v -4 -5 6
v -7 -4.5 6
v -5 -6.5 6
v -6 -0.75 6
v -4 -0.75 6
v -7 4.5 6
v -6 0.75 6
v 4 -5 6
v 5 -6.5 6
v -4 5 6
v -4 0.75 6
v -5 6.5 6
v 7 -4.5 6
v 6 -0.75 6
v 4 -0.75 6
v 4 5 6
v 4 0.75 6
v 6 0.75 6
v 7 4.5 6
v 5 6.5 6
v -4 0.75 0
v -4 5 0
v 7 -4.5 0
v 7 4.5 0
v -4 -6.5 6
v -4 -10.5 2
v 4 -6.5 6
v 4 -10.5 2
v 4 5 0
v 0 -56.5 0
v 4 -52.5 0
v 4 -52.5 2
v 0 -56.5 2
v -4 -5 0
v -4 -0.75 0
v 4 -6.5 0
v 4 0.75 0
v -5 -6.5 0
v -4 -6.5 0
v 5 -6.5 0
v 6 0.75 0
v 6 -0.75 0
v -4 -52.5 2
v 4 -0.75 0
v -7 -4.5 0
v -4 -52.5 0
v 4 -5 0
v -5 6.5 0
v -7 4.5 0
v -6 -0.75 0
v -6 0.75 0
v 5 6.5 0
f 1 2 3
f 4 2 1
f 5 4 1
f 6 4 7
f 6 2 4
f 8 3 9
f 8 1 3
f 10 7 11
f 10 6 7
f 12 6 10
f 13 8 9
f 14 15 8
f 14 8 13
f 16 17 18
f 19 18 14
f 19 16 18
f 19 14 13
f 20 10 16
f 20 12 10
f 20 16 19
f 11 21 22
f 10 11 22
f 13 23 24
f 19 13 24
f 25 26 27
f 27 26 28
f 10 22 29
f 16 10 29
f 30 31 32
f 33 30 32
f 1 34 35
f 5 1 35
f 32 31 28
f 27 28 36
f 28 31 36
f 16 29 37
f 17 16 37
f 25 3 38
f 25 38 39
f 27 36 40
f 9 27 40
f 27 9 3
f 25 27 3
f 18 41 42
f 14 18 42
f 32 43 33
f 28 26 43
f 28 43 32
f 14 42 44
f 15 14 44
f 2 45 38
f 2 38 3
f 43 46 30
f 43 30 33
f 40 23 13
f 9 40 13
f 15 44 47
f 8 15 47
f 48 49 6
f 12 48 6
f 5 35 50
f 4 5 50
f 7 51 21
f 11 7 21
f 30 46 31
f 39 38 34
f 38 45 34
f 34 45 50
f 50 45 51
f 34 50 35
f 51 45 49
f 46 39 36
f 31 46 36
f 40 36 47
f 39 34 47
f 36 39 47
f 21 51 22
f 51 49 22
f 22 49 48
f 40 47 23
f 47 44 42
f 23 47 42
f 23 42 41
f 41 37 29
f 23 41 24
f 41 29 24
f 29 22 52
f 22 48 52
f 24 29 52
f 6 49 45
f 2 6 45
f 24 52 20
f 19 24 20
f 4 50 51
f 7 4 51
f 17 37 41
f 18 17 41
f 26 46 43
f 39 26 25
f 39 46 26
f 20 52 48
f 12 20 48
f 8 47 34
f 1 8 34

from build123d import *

# Parameters (mm, degrees)
F1_DEPTH = 6
F0_W     = 8
F0_H     = 50
F2_DEPTH = 2
F3_SIZE  = 3.99999
F4_SIZE  = 2


# Not quite as in the source:
# - a fillet or chamfer is up to 0.001 mm smaller than in the source, because OpenCascade refuses the exact size


with BuildPart() as f1:
    # F0 (on Top) → F1 (new body)
    with BuildSketch(Plane.XY):
        Polygon((4, -6.5), (7, -6.5), (7, 6.5), (-7, 6.5), (-7, -6.5), (-4, -6.5), align=None)
        Polygon((4, -0.75), (4, -5), (-4, -5), (-4, -0.75), (-6, -0.75), (-6, 0.75), (-4, 0.75), (-4, 5), (4, 5), (4, 0.75), (6, 0.75), (6, -0.75), align=None, mode=Mode.SUBTRACT)
    extrude(amount=F1_DEPTH)

    # F0 (on Top) → F2 (join)
    with BuildSketch(Plane.XY):
        with Locations((0, -31.5)):
            Rectangle(F0_W, F0_H)
    extrude(amount=F2_DEPTH)

    # F3 (size 4 in the source; OpenCascade refuses exactly that, so slightly less here)
    f3_edges = [f1.edges().sort_by_distance(p)[0] for p in [
        (0, -6.5, 2),
        (-4, -56.5, 1),
        (4, -56.5, 1),
    ]]
    chamfer(f3_edges, length=F3_SIZE)

    # F4
    f4_edges = [f1.edges().sort_by_distance(p)[0] for p in [
        (-7, -6.5, 3),
        (-7, 6.5, 3),
        (7, -6.5, 3),
        (7, 6.5, 3),
    ]]
    chamfer(f4_edges, length=F4_SIZE)


solid = f1.part
